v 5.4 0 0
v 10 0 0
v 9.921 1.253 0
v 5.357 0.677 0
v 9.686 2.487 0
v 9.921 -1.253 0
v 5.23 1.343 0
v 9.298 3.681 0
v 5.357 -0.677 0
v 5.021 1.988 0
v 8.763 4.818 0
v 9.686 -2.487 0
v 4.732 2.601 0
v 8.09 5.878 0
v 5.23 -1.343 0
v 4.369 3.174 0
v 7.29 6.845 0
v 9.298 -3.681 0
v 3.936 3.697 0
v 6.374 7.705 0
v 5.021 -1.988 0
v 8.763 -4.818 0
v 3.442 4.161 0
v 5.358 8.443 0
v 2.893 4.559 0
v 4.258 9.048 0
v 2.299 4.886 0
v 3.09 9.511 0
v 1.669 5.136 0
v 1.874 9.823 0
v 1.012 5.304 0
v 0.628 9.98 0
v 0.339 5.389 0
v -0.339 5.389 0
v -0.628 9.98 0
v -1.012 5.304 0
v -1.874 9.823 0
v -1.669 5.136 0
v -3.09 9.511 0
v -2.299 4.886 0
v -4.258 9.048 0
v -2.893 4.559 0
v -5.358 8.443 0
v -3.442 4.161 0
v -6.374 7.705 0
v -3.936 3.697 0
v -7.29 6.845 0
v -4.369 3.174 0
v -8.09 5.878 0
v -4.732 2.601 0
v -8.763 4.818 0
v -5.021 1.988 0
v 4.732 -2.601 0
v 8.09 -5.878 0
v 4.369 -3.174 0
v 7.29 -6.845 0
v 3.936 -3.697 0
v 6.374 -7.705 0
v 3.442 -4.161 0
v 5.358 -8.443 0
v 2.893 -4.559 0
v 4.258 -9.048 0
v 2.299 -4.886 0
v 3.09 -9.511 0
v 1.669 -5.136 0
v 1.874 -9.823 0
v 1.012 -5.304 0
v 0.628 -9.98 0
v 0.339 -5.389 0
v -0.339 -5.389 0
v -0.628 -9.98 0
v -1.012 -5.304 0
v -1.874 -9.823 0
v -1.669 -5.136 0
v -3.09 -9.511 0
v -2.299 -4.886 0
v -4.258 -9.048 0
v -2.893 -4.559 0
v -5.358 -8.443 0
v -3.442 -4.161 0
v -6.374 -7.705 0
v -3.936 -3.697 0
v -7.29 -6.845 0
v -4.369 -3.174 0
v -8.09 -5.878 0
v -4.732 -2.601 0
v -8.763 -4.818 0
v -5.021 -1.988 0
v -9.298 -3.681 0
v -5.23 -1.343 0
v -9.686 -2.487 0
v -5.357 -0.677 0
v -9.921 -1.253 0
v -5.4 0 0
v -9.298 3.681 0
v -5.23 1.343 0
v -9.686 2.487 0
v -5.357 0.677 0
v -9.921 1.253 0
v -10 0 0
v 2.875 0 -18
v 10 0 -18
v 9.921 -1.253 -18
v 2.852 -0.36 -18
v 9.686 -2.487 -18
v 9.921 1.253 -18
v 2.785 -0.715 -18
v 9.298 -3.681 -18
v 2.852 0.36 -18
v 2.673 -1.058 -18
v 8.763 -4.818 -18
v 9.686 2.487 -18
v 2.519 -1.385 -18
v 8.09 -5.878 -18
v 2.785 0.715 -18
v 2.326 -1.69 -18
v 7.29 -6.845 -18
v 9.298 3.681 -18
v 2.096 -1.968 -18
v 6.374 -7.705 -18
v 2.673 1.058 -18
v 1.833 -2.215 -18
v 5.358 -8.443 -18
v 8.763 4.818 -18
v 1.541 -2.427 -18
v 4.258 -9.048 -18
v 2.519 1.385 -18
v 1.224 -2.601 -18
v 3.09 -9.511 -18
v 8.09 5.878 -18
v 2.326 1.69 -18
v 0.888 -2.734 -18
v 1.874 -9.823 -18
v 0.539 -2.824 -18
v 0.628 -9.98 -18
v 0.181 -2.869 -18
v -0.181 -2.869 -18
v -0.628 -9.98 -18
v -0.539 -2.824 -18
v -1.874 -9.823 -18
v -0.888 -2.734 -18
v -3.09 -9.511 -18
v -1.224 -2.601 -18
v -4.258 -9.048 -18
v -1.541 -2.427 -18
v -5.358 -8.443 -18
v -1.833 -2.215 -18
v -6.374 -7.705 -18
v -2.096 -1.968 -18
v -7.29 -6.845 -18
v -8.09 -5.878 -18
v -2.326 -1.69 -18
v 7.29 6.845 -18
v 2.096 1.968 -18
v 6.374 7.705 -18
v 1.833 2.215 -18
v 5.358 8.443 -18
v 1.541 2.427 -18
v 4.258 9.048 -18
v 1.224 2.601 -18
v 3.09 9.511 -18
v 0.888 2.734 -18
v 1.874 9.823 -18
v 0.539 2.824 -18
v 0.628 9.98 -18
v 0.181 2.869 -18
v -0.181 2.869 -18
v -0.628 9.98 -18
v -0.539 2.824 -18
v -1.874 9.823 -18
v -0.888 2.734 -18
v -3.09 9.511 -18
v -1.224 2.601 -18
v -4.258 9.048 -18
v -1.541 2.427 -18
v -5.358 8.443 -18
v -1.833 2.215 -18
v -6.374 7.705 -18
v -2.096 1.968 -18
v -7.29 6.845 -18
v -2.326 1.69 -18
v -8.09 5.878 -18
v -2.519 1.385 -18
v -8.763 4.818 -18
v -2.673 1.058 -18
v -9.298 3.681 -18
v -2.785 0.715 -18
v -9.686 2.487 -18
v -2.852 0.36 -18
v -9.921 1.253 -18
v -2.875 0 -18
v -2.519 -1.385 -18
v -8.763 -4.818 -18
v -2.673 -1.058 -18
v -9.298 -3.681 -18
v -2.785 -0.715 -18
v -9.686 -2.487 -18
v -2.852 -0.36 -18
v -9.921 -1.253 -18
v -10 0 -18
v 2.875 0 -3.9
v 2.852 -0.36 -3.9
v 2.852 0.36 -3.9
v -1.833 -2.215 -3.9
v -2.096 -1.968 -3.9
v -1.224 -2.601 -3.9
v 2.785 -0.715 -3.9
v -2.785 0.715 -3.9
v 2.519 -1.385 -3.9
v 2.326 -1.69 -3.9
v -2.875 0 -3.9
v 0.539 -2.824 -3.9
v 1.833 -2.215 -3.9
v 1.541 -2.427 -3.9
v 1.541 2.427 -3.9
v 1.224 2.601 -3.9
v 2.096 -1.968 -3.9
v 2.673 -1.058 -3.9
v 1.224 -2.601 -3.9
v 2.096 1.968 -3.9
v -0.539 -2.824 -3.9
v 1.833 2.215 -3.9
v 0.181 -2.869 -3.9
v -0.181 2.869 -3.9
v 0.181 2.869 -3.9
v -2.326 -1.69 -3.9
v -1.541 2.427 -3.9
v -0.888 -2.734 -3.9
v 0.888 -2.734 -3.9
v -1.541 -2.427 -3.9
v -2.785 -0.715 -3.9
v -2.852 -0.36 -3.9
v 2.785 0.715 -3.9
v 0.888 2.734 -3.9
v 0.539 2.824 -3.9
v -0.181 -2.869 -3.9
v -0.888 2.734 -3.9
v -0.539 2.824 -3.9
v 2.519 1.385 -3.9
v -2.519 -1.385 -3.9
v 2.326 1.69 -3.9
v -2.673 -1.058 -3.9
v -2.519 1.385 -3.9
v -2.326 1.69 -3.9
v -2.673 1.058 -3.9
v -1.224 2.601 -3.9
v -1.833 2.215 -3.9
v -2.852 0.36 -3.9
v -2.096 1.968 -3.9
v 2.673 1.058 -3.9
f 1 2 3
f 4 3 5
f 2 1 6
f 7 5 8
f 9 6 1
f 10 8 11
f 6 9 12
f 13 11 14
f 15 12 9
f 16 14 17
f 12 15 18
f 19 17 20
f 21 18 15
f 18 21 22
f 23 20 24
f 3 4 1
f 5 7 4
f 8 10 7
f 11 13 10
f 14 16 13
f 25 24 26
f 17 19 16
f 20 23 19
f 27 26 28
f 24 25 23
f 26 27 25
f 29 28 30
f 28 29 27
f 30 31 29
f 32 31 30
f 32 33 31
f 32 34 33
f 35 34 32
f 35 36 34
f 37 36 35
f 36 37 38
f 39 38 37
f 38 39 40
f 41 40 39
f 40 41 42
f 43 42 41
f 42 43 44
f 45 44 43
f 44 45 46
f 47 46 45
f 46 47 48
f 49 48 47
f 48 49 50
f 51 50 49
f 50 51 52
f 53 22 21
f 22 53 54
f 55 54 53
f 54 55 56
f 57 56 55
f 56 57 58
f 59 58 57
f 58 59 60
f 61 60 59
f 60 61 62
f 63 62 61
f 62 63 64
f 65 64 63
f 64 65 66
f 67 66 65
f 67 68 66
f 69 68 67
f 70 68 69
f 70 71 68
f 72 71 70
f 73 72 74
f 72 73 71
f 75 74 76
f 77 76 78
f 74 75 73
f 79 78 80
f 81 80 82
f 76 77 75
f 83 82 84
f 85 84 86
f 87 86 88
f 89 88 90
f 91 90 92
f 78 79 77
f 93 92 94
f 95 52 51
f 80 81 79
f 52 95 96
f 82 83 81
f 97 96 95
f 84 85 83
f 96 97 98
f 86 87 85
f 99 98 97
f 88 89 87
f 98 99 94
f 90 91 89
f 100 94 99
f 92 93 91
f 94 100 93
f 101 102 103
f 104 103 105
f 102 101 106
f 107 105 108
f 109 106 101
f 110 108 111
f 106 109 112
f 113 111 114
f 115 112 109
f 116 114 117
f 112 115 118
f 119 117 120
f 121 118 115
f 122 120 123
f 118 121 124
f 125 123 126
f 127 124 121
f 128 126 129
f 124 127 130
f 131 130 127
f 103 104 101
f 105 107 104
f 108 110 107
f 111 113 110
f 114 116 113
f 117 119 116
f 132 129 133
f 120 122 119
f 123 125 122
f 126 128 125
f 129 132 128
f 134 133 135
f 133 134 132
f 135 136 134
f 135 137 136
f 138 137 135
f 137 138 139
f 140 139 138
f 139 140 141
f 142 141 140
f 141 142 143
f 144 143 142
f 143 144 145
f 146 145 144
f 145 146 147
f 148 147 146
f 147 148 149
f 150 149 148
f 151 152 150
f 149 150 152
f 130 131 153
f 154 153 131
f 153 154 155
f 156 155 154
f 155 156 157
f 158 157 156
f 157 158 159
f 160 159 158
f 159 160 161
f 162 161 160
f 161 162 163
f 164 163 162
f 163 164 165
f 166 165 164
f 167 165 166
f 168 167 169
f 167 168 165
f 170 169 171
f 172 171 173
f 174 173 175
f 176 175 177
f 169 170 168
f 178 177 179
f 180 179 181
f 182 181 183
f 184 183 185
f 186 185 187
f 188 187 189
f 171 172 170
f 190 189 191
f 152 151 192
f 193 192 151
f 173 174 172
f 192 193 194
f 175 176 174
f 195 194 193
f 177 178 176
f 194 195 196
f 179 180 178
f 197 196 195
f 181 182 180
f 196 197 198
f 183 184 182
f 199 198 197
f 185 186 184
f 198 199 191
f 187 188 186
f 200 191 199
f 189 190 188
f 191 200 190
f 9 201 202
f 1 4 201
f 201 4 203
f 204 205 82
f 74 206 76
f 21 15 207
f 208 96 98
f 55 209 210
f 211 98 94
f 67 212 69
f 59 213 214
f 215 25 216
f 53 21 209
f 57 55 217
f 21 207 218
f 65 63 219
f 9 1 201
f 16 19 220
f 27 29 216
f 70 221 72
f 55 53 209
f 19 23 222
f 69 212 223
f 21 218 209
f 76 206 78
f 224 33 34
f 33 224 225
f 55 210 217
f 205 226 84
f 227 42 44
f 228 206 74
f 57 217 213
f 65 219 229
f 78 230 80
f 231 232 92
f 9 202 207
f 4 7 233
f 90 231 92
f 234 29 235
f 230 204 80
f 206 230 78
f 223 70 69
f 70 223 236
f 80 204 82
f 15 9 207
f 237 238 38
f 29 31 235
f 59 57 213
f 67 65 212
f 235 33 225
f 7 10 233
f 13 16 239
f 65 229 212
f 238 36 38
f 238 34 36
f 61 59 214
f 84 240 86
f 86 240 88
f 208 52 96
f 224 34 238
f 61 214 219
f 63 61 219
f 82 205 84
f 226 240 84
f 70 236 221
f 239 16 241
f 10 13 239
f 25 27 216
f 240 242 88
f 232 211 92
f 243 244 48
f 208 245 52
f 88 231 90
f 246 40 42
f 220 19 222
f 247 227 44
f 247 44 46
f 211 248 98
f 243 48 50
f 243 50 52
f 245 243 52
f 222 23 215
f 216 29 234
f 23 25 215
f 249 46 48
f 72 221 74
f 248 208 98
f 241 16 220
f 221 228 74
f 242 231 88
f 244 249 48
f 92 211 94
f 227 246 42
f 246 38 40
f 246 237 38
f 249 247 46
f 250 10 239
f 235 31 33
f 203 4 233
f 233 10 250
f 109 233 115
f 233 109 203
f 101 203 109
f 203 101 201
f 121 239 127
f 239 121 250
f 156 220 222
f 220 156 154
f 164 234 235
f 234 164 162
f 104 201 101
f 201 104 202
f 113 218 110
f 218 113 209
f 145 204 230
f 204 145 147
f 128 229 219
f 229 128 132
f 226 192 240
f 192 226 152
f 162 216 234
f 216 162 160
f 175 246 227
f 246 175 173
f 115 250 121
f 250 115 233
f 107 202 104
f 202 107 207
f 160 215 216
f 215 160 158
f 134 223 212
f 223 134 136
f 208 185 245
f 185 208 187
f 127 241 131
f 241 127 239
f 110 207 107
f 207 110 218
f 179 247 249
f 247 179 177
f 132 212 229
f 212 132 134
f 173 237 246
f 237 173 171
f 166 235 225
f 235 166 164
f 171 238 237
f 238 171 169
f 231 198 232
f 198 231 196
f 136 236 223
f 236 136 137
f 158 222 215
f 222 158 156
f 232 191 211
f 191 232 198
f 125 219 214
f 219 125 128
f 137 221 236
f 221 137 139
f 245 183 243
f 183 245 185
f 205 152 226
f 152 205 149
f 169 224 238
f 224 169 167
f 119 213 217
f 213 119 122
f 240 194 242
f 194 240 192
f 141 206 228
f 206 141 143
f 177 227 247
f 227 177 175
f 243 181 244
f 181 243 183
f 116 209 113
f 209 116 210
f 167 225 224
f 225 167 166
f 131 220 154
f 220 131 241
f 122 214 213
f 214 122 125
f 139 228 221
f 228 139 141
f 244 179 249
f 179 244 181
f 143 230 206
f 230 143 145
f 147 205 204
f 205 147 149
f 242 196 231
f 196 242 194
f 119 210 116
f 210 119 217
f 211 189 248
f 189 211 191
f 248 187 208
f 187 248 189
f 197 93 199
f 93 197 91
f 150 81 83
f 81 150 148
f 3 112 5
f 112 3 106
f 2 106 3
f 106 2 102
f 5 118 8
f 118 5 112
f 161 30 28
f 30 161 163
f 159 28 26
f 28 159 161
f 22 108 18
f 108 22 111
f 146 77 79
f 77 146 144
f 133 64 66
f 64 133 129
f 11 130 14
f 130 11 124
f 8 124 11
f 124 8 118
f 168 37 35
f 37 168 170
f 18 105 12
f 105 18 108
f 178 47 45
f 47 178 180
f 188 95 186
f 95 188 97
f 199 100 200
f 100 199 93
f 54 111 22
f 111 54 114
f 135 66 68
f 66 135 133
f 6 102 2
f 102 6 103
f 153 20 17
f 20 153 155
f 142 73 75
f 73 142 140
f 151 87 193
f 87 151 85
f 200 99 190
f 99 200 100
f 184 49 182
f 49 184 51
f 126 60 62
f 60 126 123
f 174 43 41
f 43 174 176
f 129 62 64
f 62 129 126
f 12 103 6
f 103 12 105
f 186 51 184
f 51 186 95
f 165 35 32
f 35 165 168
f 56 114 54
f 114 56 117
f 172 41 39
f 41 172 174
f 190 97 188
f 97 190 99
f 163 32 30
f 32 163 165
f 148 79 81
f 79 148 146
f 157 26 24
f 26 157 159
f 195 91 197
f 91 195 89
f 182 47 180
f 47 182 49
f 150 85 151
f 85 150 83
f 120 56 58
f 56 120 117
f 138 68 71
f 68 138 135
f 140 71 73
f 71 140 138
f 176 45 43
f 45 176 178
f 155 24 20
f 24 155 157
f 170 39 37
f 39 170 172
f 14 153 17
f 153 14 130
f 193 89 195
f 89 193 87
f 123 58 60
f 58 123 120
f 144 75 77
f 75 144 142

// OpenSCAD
$fn = 50;


difference() {
	union() {
		translate(v = [0, 0, -18.0000000000]) {
			cylinder(h = 18, r = 10.0000000000);
		}
		cylinder(h = 0, r = 16.0000000000);
	}
	union() {
		translate(v = [0, 0, 0]) {
			rotate(a = [0, 0, 0]) {
				difference() {
					union() {
						#translate(v = [0, 0, -18.0000000000]) {
							cylinder(h = 18, r = 2.6000000000);
						}
						#translate(v = [0, 0, -3.9000000000]) {
							cylinder(h = 3.9000000000, r1 = 2.8750000000, r2 = 5.4000000000);
						}
						#translate(v = [0, 0, -18.0000000000]) {
							cylinder(h = 18, r = 2.8750000000);
						}
						#translate(v = [0, 0, -18.0000000000]) {
							cylinder(h = 18, r = 2.6000000000);
						}
					}
					union();
				}
			}
		}
	}
}
